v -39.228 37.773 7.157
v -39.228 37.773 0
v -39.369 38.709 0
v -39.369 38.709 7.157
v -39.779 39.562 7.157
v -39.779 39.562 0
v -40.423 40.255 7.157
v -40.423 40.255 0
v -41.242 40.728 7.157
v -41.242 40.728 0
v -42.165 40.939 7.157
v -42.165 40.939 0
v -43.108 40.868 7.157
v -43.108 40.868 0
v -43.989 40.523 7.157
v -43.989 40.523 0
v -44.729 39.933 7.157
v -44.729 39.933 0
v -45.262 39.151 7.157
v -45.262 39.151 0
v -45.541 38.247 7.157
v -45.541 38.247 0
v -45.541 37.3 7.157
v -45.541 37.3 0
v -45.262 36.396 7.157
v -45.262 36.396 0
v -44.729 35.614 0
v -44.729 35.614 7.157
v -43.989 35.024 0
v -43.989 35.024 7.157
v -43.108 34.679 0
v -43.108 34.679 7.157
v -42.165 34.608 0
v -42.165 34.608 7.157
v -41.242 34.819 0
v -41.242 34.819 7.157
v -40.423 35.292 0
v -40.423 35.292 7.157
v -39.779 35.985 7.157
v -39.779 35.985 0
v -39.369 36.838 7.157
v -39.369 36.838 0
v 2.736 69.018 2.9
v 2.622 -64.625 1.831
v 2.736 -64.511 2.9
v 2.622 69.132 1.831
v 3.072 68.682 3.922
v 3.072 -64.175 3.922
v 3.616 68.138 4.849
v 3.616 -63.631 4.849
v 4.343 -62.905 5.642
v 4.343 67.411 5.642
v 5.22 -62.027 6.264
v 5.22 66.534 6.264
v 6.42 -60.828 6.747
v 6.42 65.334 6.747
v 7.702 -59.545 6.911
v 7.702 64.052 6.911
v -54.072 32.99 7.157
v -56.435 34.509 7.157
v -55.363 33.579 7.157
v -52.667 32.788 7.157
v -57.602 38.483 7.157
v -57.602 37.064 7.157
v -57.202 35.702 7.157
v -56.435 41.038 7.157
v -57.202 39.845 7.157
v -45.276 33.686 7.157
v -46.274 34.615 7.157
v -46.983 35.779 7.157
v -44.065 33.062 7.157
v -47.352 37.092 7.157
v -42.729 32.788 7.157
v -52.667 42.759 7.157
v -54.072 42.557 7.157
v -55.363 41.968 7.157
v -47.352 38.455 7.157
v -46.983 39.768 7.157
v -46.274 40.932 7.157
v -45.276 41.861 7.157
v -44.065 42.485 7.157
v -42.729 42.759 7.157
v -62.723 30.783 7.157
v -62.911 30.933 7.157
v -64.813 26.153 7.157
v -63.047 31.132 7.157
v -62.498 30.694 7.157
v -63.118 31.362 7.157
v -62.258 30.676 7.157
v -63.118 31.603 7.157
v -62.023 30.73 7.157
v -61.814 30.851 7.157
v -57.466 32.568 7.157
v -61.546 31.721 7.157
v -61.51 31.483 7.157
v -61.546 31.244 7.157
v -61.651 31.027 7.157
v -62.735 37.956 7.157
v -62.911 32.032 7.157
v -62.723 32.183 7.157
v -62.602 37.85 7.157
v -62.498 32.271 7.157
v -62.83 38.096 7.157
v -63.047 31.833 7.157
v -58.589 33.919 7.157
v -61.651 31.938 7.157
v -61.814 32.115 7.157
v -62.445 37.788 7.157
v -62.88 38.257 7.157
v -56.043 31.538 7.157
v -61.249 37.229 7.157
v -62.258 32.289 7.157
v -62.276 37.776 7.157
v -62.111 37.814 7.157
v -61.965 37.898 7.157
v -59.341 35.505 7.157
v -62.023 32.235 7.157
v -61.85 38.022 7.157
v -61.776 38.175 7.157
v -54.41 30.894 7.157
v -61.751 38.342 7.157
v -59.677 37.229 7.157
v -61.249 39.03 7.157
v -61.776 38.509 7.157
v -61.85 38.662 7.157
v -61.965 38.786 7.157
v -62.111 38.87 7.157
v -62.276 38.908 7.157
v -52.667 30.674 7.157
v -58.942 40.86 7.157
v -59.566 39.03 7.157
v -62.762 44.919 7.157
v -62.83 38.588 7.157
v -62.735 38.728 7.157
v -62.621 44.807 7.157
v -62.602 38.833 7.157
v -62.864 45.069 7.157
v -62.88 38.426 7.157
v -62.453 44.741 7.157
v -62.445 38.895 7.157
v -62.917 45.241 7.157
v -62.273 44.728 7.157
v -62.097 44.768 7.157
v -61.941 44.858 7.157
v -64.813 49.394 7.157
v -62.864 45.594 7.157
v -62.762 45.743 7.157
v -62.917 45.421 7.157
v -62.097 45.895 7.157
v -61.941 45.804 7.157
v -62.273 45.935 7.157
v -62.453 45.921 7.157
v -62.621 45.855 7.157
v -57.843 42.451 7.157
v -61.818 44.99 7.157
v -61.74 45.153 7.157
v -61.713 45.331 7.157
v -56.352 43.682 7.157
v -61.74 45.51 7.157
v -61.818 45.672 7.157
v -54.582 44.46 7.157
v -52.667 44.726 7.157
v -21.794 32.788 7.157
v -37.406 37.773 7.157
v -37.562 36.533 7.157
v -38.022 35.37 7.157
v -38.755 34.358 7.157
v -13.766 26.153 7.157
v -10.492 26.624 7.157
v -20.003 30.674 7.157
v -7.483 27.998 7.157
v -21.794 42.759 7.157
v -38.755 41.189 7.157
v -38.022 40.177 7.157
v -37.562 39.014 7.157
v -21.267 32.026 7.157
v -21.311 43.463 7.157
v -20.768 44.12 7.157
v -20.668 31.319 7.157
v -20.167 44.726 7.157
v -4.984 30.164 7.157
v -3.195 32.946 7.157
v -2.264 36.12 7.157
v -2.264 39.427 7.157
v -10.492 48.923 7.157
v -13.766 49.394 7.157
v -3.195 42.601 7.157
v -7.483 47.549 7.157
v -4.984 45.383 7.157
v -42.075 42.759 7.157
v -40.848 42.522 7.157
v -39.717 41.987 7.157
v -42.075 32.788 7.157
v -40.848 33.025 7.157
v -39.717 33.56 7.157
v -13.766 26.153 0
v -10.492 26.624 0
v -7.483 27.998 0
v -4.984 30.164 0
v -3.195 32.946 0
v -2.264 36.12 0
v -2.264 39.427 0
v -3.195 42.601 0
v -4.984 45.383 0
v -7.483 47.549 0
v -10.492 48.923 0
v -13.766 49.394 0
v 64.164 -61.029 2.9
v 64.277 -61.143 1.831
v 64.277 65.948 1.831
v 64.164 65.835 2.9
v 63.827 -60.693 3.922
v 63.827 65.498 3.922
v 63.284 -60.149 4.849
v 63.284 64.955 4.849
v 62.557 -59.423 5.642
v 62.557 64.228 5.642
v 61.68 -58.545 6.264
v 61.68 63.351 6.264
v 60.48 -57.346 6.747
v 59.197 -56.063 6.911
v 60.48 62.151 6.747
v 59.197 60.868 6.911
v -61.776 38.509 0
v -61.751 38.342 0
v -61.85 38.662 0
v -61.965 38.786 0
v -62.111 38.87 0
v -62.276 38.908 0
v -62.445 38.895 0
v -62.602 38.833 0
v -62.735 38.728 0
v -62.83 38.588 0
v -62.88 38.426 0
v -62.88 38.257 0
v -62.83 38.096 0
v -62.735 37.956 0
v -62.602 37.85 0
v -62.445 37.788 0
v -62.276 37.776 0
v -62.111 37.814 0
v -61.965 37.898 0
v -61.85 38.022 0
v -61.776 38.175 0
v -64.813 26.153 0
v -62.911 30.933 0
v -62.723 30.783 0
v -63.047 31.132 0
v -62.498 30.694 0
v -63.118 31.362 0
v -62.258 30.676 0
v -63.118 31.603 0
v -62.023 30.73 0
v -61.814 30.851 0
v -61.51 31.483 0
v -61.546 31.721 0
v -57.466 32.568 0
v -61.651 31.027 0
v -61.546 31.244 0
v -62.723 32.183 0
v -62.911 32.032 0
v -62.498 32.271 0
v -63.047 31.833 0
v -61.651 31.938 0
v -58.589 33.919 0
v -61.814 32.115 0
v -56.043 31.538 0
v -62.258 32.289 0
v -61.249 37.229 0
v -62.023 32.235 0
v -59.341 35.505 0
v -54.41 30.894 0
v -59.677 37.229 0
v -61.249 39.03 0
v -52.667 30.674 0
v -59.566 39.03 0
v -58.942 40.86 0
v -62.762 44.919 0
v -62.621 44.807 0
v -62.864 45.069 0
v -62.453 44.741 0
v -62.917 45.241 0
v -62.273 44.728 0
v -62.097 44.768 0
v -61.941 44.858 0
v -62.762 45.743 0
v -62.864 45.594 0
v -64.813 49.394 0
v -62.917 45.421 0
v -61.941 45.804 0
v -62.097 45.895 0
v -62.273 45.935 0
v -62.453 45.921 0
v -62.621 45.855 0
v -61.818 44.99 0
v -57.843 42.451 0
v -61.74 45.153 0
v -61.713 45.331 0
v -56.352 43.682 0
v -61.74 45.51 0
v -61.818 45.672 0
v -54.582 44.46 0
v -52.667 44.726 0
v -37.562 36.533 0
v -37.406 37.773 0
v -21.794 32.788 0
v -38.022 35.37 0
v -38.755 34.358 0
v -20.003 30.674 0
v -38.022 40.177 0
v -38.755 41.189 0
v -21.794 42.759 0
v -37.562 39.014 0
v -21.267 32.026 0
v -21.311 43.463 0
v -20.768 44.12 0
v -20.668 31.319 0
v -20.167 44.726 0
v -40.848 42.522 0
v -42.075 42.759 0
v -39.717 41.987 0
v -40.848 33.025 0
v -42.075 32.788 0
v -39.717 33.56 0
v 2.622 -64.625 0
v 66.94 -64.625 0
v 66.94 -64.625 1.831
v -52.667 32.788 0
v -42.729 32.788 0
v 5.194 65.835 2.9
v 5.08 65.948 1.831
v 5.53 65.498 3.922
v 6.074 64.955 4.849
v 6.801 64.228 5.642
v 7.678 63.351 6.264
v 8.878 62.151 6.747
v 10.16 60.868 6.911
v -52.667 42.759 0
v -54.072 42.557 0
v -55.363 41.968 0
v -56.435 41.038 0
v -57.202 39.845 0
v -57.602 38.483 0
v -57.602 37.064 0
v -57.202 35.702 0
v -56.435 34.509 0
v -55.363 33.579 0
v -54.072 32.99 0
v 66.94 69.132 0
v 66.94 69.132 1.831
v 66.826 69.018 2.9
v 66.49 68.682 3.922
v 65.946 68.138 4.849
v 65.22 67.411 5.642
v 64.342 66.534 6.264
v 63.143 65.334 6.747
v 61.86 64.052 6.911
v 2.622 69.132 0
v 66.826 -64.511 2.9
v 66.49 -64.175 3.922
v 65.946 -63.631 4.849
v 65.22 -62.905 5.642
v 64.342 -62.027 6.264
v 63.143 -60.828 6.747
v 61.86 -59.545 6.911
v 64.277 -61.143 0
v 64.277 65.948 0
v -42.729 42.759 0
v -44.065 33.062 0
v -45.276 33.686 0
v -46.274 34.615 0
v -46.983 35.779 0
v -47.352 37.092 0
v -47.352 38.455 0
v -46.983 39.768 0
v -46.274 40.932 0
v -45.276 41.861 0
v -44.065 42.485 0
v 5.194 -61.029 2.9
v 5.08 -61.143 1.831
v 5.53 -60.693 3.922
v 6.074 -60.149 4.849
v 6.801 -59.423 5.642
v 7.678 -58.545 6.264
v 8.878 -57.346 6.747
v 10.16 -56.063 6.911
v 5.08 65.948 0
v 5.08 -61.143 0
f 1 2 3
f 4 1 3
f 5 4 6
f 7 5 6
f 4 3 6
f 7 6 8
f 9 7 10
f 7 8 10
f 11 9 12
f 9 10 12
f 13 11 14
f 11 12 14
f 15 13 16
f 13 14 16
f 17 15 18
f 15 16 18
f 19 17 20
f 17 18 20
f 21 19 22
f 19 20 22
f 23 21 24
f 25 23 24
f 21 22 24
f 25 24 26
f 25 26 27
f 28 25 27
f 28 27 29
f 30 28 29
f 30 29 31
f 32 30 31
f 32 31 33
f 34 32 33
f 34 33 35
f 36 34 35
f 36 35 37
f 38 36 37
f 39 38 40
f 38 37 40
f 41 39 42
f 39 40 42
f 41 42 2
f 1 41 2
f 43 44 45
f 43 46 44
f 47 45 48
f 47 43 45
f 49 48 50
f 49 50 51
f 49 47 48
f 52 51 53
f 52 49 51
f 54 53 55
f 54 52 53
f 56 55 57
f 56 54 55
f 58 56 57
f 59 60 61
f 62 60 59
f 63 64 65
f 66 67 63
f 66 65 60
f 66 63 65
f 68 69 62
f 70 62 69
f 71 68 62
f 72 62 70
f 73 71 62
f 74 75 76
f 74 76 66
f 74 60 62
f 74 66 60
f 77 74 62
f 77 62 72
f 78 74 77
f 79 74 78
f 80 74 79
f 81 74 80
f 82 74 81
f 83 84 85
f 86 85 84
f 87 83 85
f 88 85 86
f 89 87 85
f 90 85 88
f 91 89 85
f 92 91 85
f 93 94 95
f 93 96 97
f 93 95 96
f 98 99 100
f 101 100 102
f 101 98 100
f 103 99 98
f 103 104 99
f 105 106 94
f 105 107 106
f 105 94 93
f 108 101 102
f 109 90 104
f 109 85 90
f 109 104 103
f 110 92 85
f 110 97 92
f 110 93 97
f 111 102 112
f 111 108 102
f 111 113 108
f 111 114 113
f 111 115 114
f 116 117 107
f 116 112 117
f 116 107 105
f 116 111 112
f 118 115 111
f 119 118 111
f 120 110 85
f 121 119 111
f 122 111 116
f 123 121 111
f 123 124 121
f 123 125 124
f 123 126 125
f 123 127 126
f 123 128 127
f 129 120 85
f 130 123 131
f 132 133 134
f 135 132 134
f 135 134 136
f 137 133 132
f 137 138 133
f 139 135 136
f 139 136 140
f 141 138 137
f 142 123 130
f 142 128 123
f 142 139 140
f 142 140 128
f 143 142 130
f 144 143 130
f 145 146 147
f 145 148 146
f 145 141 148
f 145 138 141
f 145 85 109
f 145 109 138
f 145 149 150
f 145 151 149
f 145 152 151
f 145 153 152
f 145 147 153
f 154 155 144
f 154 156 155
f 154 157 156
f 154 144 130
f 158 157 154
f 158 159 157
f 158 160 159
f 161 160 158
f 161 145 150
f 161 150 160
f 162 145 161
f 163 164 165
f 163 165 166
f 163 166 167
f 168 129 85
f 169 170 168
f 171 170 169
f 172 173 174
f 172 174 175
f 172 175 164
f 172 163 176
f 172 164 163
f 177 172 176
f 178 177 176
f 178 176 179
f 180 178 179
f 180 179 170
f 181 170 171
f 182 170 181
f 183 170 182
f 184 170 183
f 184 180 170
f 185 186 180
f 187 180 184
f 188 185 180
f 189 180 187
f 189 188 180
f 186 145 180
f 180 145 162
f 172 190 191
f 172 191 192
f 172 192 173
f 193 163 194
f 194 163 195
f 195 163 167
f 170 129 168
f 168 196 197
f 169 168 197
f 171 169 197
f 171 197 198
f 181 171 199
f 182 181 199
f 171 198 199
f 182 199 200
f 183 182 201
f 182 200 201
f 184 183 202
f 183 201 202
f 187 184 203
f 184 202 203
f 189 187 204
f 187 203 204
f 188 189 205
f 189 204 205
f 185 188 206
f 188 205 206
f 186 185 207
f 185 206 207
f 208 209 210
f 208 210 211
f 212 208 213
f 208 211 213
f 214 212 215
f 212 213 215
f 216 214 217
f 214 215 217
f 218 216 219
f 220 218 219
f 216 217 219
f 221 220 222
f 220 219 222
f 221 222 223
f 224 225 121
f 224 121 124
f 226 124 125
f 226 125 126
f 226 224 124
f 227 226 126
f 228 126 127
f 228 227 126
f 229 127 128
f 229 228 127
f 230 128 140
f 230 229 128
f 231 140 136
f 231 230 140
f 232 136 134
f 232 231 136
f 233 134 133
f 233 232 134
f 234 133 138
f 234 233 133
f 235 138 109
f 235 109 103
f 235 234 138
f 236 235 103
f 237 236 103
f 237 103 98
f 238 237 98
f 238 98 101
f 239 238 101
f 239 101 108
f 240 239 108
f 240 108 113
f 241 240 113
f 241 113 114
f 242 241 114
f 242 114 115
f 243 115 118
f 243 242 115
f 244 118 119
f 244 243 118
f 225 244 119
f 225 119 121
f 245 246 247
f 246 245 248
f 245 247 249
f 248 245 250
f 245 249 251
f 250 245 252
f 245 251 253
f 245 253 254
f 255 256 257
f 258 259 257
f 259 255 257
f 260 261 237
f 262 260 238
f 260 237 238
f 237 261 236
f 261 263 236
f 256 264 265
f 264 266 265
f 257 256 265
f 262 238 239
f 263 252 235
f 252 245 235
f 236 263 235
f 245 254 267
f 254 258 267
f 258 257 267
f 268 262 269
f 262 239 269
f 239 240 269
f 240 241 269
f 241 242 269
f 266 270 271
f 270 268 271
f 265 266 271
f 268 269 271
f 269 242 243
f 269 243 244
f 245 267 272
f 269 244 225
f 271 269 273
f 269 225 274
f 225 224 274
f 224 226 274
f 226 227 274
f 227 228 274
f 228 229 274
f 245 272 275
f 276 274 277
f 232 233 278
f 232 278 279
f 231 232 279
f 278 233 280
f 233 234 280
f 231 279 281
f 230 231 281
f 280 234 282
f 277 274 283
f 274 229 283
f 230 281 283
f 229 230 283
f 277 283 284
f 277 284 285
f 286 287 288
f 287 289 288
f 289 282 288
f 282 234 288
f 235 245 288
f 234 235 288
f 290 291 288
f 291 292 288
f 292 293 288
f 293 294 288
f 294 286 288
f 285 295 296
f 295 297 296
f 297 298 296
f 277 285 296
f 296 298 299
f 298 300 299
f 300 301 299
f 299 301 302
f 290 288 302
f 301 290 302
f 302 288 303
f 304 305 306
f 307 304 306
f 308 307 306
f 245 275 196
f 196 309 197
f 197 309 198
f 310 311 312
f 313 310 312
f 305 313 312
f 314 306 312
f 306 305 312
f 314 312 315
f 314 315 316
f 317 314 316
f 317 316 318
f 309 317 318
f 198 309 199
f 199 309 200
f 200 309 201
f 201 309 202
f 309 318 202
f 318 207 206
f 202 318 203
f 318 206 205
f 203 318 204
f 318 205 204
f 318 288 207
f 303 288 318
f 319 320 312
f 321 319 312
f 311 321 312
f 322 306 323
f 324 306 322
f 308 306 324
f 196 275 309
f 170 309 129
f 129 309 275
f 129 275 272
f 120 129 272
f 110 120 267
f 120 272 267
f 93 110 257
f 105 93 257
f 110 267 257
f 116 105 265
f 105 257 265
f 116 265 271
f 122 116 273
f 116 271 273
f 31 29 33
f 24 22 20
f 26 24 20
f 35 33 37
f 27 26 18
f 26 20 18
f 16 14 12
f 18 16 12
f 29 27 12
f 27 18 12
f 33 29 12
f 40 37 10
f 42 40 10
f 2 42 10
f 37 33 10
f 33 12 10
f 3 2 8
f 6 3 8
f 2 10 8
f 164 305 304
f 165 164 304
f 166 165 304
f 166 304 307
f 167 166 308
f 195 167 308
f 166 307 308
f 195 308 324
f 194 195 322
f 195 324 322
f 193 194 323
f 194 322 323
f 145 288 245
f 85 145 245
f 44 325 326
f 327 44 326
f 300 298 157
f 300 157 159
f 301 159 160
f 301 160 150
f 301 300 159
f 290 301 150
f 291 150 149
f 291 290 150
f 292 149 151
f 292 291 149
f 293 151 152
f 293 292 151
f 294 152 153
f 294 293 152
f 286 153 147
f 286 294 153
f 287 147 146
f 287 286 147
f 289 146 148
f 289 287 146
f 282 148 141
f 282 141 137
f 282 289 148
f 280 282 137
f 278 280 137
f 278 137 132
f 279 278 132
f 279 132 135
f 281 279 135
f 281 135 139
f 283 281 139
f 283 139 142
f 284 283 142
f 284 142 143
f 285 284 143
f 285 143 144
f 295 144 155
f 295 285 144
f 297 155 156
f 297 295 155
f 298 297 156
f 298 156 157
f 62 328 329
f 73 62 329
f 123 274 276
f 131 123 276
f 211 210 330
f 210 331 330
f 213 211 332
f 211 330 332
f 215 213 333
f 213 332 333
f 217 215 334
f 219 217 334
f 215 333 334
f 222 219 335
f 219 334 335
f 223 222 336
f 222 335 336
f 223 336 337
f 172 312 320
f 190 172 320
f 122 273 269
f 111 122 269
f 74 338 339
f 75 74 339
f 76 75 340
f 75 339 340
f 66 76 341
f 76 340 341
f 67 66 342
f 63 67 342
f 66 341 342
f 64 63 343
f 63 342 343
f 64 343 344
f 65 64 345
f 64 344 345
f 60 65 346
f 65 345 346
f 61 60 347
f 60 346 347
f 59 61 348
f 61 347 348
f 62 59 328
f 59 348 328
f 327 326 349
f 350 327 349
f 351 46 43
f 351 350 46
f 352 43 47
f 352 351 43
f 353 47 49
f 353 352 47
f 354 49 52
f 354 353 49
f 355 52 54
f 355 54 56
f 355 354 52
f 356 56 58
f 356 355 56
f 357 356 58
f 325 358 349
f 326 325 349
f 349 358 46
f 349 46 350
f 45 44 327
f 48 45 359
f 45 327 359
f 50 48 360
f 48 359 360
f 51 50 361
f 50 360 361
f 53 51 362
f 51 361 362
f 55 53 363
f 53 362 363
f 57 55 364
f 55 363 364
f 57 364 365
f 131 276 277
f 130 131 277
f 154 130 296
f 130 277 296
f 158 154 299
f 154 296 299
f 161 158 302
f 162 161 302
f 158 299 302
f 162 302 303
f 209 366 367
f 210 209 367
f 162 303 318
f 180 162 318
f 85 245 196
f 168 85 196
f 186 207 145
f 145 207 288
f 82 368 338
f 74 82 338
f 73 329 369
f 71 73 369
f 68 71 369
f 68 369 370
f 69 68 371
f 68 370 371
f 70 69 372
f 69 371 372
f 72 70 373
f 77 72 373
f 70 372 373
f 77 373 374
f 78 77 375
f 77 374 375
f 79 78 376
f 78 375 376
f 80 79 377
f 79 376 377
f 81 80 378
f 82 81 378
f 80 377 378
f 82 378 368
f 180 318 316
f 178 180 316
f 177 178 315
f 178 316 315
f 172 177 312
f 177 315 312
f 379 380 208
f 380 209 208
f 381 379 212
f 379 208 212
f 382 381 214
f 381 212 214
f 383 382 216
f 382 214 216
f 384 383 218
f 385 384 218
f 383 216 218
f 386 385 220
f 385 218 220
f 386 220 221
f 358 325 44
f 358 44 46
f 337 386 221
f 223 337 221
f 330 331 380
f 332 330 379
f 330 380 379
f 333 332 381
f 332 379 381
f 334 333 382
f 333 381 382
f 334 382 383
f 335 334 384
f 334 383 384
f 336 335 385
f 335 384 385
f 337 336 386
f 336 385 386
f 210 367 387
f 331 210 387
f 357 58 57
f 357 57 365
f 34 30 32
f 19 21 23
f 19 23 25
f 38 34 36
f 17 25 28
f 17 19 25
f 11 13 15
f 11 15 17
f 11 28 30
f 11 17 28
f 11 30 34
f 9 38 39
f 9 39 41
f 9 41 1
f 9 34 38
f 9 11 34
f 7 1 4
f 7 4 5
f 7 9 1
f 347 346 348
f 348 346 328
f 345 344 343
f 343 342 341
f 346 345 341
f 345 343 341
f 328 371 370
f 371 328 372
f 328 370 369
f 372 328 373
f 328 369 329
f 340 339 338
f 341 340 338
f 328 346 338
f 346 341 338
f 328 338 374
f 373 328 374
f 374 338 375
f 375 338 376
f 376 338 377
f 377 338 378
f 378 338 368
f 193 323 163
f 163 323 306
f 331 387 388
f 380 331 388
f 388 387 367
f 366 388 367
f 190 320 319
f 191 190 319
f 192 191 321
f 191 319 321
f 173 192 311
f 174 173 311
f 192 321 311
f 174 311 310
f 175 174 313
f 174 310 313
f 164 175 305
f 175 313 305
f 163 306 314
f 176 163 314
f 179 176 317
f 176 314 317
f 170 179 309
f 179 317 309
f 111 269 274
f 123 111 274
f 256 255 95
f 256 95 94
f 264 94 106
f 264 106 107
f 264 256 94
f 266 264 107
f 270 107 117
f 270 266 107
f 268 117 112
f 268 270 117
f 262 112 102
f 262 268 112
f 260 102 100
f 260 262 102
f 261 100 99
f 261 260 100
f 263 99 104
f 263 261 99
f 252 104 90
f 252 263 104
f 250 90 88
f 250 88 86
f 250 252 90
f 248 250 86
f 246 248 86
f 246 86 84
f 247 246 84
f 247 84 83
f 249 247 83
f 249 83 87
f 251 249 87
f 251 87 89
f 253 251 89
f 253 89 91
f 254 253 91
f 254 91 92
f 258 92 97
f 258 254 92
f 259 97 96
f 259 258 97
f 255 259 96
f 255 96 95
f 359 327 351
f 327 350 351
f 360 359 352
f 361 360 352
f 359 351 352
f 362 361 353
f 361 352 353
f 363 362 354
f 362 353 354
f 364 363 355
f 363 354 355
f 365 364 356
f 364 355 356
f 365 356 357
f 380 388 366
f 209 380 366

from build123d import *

# Parameters (mm, degrees)
F0_R     = 7.2628338821
F0_R_2   = 0.8083693683
F0_R_3   = 0.5676010392
F0_R_4   = 0.605262816
F1_DEPTH = 7.15712
F0_R_5   = 3.1742869667
F4_DEPTH = 6.91126
F3_W     = 64.3180012703
F3_H     = 133.7568685412
F5_R     = 5.08
F5_2_R   = 5.08


with BuildPart() as f1:
    # F0 (on Top) → F1 (new body)
    with BuildSketch(Plane.XY):
        with BuildLine():
            ThreePointArc((-13.7657718733, 26.1529572308), (-2.1452372894, 37.7734918147), (-13.7657718733, 49.3940263987))
            Line((-13.7657718733, 49.3940263987), (-64.8131147027, 49.3940263987))
            Line((-64.8131147027, 49.3940263987), (-64.8131147027, 26.1529572308))
            Line((-64.8131147027, 26.1529572308), (-13.7657718733, 26.1529572308))
        make_face()
        with BuildLine():
            ThreePointArc((-20.1666126741, 44.7259098291), (-9.9698891989, 46.4278637692), (-4.3155401722, 37.7734918147))
            ThreePointArc((-4.3155401722, 37.7734918147), (-9.8695864973, 29.1638101296), (-20.0033288032, 30.6742127844))
            Line((-20.0033288032, 30.6742127844), (-42.7291683002, 30.6742127844))
            Line((-42.7291683002, 30.6742127844), (-52.6670942683, 30.6742127844))
            ThreePointArc((-52.6670942683, 30.6742127844), (-57.4657426221, 32.568246673), (-59.6771440199, 37.2291579843))
            Line((-59.6771440199, 37.2291579843), (-61.2490288913, 37.2291579843))
            Line((-61.2490288913, 37.2291579843), (-61.2490288913, 30.6505970657))
            ThreePointArc((-61.2490288913, 30.6505970657), (-62.3184870929, 29.5811388642), (-63.3879452944, 30.6505970657))
            Line((-63.3879452944, 30.6505970657), (-63.3879452944, 46.0331365466))
            ThreePointArc((-63.3879452944, 46.0331365466), (-62.3184870929, 47.1025947481), (-61.2490288913, 46.0331365466))
            Line((-61.2490288913, 46.0331365466), (-61.2490288913, 39.0296056867))
            Line((-61.2490288913, 39.0296056867), (-59.5659970217, 39.0296056867))
            ThreePointArc((-59.5659970217, 39.0296056867), (-57.1404246855, 43.1177972212), (-52.6670942683, 44.7259098291))
            Line((-52.6670942683, 44.7259098291), (-42.7291683002, 44.7259098291))
            Line((-42.7291683002, 44.7259098291), (-20.1666126741, 44.7259098291))
        make_face(mode=Mode.SUBTRACT)
        with BuildLine():
            ThreePointArc((-20.0033288032, 30.6742127844), (-9.8695864973, 29.1638101296), (-4.3155401722, 37.7734918147))
            ThreePointArc((-4.3155401722, 37.7734918147), (-9.9698891989, 46.4278637692), (-20.1666126741, 44.7259098291))
            ThreePointArc((-20.1666126741, 44.7259098291), (-21.0469322653, 43.7977413572), (-21.7938318702, 42.759184534))
            ThreePointArc((-21.7938318702, 42.759184534), (-23.2160035744, 37.7734918147), (-21.7938318702, 32.7877990955))
            ThreePointArc((-21.7938318702, 32.7877990955), (-20.976442324, 31.6650459523), (-20.0033288032, 30.6742127844))
        make_face()
        with Locations((-13.7657718733, 37.7734918147)):
            Circle(F0_R, mode=Mode.SUBTRACT)
        with Locations((-13.7657718733, 37.7734918147)):
            Circle(F0_R)
        with BuildLine():
            ThreePointArc((-21.7938318702, 32.7877990955), (-23.2160035744, 37.7734918147), (-21.7938318702, 42.759184534))
            Line((-21.7938318702, 42.759184534), (-42.0750089841, 42.759184534))
            ThreePointArc((-42.0750089841, 42.759184534), (-38.7552861337, 41.1888899552), (-37.4056786316, 37.7734918147))
            ThreePointArc((-37.4056786316, 37.7734918147), (-38.7552861337, 34.3580936743), (-42.0750089841, 32.7877990955))
            Line((-42.0750089841, 32.7877990955), (-21.7938318702, 32.7877990955))
        make_face()
        with BuildLine():
            Line((-61.2490288913, 37.2291579843), (-61.2490288913, 39.0296056867))
            Line((-61.2490288913, 39.0296056867), (-61.2490288913, 46.0331365466))
            ThreePointArc((-61.2490288913, 46.0331365466), (-62.3184870929, 47.1025947481), (-63.3879452944, 46.0331365466))
            Line((-63.3879452944, 46.0331365466), (-63.3879452944, 30.6505970657))
            ThreePointArc((-63.3879452944, 30.6505970657), (-62.3184870929, 29.5811388642), (-61.2490288913, 30.6505970657))
            Line((-61.2490288913, 30.6505970657), (-61.2490288913, 37.2291579843))
        make_face()
        with Locations((-62.3184870929, 31.4825821528)):
            Circle(F0_R_2, mode=Mode.SUBTRACT)
        with Locations((-62.3184870929, 38.3418668061)):
            Circle(F0_R_3, mode=Mode.SUBTRACT)
        with Locations((-62.3184870929, 45.3311726451)):
            Circle(F0_R_4, mode=Mode.SUBTRACT)
    extrude(amount=F1_DEPTH)


with BuildPart() as f1b:
    # F0 (on Top) → F1, piece 2 (new body)
    with BuildSketch(Plane.XY):
        with Locations((-42.4020886421, 37.7734918147)):
            Circle(F0_R_5)
    extrude(amount=F1_DEPTH)


with BuildPart() as f1c:
    # F0 (on Top) → F1, piece 3 (new body)
    with BuildSketch(Plane.XY):
        with BuildLine():
            ThreePointArc((-42.7291683002, 32.7877990955), (-47.3984986526, 37.7734918147), (-42.7291683002, 42.759184534))
            Line((-42.7291683002, 42.759184534), (-52.6670942683, 42.759184534))
            ThreePointArc((-52.6670942683, 42.759184534), (-57.6527869875, 37.7734918147), (-52.6670942683, 32.7877990955))
            Line((-52.6670942683, 32.7877990955), (-42.7291683002, 32.7877990955))
        make_face()
    extrude(amount=F1_DEPTH)


with BuildPart() as f4:
    # F2 (on Top) → F4 (new body)
    with BuildSketch(Plane.XY):
        Polygon((33.9215472341, 65.9483455345), (5.0802426413, 65.9483455345), (5.0802426413, -61.1430704594), (64.2773881555, -61.1430704594), (64.2773881555, 65.9483455345), align=None)
    extrude(amount=F4_DEPTH)

    # F5#2
    f5_2_edges = [f4.edges().sort_by_distance(p)[0] for p in [
        (34.678815, 65.948346, 6.91126),
        (64.277388, 2.402638, 6.91126),
        (5.080243, 2.402638, 6.91126),
        (34.678815, -61.14307, 6.91126),
    ]]
    fillet(f5_2_edges, radius=F5_2_R)


with BuildPart() as f4b:
    # F3 (on Top) → F4, piece 2 (new body)
    with BuildSketch(Plane.XY):
        with Locations((34.7812324762, 2.2531785071)):
            Rectangle(F3_W, F3_H)
    extrude(amount=F4_DEPTH)

    # F5
    f5_edges = [f4b.edges().sort_by_distance(p)[0] for p in [
        (34.781232, 69.131613, 6.91126),
        (66.940233, 2.253179, 6.91126),
        (2.622232, 2.253179, 6.91126),
        (34.781232, -64.625256, 6.91126),
    ]]
    fillet(f5_edges, radius=F5_R)


solid = Compound([f1.part, f1b.part, f1c.part, f4.part, f4b.part])
